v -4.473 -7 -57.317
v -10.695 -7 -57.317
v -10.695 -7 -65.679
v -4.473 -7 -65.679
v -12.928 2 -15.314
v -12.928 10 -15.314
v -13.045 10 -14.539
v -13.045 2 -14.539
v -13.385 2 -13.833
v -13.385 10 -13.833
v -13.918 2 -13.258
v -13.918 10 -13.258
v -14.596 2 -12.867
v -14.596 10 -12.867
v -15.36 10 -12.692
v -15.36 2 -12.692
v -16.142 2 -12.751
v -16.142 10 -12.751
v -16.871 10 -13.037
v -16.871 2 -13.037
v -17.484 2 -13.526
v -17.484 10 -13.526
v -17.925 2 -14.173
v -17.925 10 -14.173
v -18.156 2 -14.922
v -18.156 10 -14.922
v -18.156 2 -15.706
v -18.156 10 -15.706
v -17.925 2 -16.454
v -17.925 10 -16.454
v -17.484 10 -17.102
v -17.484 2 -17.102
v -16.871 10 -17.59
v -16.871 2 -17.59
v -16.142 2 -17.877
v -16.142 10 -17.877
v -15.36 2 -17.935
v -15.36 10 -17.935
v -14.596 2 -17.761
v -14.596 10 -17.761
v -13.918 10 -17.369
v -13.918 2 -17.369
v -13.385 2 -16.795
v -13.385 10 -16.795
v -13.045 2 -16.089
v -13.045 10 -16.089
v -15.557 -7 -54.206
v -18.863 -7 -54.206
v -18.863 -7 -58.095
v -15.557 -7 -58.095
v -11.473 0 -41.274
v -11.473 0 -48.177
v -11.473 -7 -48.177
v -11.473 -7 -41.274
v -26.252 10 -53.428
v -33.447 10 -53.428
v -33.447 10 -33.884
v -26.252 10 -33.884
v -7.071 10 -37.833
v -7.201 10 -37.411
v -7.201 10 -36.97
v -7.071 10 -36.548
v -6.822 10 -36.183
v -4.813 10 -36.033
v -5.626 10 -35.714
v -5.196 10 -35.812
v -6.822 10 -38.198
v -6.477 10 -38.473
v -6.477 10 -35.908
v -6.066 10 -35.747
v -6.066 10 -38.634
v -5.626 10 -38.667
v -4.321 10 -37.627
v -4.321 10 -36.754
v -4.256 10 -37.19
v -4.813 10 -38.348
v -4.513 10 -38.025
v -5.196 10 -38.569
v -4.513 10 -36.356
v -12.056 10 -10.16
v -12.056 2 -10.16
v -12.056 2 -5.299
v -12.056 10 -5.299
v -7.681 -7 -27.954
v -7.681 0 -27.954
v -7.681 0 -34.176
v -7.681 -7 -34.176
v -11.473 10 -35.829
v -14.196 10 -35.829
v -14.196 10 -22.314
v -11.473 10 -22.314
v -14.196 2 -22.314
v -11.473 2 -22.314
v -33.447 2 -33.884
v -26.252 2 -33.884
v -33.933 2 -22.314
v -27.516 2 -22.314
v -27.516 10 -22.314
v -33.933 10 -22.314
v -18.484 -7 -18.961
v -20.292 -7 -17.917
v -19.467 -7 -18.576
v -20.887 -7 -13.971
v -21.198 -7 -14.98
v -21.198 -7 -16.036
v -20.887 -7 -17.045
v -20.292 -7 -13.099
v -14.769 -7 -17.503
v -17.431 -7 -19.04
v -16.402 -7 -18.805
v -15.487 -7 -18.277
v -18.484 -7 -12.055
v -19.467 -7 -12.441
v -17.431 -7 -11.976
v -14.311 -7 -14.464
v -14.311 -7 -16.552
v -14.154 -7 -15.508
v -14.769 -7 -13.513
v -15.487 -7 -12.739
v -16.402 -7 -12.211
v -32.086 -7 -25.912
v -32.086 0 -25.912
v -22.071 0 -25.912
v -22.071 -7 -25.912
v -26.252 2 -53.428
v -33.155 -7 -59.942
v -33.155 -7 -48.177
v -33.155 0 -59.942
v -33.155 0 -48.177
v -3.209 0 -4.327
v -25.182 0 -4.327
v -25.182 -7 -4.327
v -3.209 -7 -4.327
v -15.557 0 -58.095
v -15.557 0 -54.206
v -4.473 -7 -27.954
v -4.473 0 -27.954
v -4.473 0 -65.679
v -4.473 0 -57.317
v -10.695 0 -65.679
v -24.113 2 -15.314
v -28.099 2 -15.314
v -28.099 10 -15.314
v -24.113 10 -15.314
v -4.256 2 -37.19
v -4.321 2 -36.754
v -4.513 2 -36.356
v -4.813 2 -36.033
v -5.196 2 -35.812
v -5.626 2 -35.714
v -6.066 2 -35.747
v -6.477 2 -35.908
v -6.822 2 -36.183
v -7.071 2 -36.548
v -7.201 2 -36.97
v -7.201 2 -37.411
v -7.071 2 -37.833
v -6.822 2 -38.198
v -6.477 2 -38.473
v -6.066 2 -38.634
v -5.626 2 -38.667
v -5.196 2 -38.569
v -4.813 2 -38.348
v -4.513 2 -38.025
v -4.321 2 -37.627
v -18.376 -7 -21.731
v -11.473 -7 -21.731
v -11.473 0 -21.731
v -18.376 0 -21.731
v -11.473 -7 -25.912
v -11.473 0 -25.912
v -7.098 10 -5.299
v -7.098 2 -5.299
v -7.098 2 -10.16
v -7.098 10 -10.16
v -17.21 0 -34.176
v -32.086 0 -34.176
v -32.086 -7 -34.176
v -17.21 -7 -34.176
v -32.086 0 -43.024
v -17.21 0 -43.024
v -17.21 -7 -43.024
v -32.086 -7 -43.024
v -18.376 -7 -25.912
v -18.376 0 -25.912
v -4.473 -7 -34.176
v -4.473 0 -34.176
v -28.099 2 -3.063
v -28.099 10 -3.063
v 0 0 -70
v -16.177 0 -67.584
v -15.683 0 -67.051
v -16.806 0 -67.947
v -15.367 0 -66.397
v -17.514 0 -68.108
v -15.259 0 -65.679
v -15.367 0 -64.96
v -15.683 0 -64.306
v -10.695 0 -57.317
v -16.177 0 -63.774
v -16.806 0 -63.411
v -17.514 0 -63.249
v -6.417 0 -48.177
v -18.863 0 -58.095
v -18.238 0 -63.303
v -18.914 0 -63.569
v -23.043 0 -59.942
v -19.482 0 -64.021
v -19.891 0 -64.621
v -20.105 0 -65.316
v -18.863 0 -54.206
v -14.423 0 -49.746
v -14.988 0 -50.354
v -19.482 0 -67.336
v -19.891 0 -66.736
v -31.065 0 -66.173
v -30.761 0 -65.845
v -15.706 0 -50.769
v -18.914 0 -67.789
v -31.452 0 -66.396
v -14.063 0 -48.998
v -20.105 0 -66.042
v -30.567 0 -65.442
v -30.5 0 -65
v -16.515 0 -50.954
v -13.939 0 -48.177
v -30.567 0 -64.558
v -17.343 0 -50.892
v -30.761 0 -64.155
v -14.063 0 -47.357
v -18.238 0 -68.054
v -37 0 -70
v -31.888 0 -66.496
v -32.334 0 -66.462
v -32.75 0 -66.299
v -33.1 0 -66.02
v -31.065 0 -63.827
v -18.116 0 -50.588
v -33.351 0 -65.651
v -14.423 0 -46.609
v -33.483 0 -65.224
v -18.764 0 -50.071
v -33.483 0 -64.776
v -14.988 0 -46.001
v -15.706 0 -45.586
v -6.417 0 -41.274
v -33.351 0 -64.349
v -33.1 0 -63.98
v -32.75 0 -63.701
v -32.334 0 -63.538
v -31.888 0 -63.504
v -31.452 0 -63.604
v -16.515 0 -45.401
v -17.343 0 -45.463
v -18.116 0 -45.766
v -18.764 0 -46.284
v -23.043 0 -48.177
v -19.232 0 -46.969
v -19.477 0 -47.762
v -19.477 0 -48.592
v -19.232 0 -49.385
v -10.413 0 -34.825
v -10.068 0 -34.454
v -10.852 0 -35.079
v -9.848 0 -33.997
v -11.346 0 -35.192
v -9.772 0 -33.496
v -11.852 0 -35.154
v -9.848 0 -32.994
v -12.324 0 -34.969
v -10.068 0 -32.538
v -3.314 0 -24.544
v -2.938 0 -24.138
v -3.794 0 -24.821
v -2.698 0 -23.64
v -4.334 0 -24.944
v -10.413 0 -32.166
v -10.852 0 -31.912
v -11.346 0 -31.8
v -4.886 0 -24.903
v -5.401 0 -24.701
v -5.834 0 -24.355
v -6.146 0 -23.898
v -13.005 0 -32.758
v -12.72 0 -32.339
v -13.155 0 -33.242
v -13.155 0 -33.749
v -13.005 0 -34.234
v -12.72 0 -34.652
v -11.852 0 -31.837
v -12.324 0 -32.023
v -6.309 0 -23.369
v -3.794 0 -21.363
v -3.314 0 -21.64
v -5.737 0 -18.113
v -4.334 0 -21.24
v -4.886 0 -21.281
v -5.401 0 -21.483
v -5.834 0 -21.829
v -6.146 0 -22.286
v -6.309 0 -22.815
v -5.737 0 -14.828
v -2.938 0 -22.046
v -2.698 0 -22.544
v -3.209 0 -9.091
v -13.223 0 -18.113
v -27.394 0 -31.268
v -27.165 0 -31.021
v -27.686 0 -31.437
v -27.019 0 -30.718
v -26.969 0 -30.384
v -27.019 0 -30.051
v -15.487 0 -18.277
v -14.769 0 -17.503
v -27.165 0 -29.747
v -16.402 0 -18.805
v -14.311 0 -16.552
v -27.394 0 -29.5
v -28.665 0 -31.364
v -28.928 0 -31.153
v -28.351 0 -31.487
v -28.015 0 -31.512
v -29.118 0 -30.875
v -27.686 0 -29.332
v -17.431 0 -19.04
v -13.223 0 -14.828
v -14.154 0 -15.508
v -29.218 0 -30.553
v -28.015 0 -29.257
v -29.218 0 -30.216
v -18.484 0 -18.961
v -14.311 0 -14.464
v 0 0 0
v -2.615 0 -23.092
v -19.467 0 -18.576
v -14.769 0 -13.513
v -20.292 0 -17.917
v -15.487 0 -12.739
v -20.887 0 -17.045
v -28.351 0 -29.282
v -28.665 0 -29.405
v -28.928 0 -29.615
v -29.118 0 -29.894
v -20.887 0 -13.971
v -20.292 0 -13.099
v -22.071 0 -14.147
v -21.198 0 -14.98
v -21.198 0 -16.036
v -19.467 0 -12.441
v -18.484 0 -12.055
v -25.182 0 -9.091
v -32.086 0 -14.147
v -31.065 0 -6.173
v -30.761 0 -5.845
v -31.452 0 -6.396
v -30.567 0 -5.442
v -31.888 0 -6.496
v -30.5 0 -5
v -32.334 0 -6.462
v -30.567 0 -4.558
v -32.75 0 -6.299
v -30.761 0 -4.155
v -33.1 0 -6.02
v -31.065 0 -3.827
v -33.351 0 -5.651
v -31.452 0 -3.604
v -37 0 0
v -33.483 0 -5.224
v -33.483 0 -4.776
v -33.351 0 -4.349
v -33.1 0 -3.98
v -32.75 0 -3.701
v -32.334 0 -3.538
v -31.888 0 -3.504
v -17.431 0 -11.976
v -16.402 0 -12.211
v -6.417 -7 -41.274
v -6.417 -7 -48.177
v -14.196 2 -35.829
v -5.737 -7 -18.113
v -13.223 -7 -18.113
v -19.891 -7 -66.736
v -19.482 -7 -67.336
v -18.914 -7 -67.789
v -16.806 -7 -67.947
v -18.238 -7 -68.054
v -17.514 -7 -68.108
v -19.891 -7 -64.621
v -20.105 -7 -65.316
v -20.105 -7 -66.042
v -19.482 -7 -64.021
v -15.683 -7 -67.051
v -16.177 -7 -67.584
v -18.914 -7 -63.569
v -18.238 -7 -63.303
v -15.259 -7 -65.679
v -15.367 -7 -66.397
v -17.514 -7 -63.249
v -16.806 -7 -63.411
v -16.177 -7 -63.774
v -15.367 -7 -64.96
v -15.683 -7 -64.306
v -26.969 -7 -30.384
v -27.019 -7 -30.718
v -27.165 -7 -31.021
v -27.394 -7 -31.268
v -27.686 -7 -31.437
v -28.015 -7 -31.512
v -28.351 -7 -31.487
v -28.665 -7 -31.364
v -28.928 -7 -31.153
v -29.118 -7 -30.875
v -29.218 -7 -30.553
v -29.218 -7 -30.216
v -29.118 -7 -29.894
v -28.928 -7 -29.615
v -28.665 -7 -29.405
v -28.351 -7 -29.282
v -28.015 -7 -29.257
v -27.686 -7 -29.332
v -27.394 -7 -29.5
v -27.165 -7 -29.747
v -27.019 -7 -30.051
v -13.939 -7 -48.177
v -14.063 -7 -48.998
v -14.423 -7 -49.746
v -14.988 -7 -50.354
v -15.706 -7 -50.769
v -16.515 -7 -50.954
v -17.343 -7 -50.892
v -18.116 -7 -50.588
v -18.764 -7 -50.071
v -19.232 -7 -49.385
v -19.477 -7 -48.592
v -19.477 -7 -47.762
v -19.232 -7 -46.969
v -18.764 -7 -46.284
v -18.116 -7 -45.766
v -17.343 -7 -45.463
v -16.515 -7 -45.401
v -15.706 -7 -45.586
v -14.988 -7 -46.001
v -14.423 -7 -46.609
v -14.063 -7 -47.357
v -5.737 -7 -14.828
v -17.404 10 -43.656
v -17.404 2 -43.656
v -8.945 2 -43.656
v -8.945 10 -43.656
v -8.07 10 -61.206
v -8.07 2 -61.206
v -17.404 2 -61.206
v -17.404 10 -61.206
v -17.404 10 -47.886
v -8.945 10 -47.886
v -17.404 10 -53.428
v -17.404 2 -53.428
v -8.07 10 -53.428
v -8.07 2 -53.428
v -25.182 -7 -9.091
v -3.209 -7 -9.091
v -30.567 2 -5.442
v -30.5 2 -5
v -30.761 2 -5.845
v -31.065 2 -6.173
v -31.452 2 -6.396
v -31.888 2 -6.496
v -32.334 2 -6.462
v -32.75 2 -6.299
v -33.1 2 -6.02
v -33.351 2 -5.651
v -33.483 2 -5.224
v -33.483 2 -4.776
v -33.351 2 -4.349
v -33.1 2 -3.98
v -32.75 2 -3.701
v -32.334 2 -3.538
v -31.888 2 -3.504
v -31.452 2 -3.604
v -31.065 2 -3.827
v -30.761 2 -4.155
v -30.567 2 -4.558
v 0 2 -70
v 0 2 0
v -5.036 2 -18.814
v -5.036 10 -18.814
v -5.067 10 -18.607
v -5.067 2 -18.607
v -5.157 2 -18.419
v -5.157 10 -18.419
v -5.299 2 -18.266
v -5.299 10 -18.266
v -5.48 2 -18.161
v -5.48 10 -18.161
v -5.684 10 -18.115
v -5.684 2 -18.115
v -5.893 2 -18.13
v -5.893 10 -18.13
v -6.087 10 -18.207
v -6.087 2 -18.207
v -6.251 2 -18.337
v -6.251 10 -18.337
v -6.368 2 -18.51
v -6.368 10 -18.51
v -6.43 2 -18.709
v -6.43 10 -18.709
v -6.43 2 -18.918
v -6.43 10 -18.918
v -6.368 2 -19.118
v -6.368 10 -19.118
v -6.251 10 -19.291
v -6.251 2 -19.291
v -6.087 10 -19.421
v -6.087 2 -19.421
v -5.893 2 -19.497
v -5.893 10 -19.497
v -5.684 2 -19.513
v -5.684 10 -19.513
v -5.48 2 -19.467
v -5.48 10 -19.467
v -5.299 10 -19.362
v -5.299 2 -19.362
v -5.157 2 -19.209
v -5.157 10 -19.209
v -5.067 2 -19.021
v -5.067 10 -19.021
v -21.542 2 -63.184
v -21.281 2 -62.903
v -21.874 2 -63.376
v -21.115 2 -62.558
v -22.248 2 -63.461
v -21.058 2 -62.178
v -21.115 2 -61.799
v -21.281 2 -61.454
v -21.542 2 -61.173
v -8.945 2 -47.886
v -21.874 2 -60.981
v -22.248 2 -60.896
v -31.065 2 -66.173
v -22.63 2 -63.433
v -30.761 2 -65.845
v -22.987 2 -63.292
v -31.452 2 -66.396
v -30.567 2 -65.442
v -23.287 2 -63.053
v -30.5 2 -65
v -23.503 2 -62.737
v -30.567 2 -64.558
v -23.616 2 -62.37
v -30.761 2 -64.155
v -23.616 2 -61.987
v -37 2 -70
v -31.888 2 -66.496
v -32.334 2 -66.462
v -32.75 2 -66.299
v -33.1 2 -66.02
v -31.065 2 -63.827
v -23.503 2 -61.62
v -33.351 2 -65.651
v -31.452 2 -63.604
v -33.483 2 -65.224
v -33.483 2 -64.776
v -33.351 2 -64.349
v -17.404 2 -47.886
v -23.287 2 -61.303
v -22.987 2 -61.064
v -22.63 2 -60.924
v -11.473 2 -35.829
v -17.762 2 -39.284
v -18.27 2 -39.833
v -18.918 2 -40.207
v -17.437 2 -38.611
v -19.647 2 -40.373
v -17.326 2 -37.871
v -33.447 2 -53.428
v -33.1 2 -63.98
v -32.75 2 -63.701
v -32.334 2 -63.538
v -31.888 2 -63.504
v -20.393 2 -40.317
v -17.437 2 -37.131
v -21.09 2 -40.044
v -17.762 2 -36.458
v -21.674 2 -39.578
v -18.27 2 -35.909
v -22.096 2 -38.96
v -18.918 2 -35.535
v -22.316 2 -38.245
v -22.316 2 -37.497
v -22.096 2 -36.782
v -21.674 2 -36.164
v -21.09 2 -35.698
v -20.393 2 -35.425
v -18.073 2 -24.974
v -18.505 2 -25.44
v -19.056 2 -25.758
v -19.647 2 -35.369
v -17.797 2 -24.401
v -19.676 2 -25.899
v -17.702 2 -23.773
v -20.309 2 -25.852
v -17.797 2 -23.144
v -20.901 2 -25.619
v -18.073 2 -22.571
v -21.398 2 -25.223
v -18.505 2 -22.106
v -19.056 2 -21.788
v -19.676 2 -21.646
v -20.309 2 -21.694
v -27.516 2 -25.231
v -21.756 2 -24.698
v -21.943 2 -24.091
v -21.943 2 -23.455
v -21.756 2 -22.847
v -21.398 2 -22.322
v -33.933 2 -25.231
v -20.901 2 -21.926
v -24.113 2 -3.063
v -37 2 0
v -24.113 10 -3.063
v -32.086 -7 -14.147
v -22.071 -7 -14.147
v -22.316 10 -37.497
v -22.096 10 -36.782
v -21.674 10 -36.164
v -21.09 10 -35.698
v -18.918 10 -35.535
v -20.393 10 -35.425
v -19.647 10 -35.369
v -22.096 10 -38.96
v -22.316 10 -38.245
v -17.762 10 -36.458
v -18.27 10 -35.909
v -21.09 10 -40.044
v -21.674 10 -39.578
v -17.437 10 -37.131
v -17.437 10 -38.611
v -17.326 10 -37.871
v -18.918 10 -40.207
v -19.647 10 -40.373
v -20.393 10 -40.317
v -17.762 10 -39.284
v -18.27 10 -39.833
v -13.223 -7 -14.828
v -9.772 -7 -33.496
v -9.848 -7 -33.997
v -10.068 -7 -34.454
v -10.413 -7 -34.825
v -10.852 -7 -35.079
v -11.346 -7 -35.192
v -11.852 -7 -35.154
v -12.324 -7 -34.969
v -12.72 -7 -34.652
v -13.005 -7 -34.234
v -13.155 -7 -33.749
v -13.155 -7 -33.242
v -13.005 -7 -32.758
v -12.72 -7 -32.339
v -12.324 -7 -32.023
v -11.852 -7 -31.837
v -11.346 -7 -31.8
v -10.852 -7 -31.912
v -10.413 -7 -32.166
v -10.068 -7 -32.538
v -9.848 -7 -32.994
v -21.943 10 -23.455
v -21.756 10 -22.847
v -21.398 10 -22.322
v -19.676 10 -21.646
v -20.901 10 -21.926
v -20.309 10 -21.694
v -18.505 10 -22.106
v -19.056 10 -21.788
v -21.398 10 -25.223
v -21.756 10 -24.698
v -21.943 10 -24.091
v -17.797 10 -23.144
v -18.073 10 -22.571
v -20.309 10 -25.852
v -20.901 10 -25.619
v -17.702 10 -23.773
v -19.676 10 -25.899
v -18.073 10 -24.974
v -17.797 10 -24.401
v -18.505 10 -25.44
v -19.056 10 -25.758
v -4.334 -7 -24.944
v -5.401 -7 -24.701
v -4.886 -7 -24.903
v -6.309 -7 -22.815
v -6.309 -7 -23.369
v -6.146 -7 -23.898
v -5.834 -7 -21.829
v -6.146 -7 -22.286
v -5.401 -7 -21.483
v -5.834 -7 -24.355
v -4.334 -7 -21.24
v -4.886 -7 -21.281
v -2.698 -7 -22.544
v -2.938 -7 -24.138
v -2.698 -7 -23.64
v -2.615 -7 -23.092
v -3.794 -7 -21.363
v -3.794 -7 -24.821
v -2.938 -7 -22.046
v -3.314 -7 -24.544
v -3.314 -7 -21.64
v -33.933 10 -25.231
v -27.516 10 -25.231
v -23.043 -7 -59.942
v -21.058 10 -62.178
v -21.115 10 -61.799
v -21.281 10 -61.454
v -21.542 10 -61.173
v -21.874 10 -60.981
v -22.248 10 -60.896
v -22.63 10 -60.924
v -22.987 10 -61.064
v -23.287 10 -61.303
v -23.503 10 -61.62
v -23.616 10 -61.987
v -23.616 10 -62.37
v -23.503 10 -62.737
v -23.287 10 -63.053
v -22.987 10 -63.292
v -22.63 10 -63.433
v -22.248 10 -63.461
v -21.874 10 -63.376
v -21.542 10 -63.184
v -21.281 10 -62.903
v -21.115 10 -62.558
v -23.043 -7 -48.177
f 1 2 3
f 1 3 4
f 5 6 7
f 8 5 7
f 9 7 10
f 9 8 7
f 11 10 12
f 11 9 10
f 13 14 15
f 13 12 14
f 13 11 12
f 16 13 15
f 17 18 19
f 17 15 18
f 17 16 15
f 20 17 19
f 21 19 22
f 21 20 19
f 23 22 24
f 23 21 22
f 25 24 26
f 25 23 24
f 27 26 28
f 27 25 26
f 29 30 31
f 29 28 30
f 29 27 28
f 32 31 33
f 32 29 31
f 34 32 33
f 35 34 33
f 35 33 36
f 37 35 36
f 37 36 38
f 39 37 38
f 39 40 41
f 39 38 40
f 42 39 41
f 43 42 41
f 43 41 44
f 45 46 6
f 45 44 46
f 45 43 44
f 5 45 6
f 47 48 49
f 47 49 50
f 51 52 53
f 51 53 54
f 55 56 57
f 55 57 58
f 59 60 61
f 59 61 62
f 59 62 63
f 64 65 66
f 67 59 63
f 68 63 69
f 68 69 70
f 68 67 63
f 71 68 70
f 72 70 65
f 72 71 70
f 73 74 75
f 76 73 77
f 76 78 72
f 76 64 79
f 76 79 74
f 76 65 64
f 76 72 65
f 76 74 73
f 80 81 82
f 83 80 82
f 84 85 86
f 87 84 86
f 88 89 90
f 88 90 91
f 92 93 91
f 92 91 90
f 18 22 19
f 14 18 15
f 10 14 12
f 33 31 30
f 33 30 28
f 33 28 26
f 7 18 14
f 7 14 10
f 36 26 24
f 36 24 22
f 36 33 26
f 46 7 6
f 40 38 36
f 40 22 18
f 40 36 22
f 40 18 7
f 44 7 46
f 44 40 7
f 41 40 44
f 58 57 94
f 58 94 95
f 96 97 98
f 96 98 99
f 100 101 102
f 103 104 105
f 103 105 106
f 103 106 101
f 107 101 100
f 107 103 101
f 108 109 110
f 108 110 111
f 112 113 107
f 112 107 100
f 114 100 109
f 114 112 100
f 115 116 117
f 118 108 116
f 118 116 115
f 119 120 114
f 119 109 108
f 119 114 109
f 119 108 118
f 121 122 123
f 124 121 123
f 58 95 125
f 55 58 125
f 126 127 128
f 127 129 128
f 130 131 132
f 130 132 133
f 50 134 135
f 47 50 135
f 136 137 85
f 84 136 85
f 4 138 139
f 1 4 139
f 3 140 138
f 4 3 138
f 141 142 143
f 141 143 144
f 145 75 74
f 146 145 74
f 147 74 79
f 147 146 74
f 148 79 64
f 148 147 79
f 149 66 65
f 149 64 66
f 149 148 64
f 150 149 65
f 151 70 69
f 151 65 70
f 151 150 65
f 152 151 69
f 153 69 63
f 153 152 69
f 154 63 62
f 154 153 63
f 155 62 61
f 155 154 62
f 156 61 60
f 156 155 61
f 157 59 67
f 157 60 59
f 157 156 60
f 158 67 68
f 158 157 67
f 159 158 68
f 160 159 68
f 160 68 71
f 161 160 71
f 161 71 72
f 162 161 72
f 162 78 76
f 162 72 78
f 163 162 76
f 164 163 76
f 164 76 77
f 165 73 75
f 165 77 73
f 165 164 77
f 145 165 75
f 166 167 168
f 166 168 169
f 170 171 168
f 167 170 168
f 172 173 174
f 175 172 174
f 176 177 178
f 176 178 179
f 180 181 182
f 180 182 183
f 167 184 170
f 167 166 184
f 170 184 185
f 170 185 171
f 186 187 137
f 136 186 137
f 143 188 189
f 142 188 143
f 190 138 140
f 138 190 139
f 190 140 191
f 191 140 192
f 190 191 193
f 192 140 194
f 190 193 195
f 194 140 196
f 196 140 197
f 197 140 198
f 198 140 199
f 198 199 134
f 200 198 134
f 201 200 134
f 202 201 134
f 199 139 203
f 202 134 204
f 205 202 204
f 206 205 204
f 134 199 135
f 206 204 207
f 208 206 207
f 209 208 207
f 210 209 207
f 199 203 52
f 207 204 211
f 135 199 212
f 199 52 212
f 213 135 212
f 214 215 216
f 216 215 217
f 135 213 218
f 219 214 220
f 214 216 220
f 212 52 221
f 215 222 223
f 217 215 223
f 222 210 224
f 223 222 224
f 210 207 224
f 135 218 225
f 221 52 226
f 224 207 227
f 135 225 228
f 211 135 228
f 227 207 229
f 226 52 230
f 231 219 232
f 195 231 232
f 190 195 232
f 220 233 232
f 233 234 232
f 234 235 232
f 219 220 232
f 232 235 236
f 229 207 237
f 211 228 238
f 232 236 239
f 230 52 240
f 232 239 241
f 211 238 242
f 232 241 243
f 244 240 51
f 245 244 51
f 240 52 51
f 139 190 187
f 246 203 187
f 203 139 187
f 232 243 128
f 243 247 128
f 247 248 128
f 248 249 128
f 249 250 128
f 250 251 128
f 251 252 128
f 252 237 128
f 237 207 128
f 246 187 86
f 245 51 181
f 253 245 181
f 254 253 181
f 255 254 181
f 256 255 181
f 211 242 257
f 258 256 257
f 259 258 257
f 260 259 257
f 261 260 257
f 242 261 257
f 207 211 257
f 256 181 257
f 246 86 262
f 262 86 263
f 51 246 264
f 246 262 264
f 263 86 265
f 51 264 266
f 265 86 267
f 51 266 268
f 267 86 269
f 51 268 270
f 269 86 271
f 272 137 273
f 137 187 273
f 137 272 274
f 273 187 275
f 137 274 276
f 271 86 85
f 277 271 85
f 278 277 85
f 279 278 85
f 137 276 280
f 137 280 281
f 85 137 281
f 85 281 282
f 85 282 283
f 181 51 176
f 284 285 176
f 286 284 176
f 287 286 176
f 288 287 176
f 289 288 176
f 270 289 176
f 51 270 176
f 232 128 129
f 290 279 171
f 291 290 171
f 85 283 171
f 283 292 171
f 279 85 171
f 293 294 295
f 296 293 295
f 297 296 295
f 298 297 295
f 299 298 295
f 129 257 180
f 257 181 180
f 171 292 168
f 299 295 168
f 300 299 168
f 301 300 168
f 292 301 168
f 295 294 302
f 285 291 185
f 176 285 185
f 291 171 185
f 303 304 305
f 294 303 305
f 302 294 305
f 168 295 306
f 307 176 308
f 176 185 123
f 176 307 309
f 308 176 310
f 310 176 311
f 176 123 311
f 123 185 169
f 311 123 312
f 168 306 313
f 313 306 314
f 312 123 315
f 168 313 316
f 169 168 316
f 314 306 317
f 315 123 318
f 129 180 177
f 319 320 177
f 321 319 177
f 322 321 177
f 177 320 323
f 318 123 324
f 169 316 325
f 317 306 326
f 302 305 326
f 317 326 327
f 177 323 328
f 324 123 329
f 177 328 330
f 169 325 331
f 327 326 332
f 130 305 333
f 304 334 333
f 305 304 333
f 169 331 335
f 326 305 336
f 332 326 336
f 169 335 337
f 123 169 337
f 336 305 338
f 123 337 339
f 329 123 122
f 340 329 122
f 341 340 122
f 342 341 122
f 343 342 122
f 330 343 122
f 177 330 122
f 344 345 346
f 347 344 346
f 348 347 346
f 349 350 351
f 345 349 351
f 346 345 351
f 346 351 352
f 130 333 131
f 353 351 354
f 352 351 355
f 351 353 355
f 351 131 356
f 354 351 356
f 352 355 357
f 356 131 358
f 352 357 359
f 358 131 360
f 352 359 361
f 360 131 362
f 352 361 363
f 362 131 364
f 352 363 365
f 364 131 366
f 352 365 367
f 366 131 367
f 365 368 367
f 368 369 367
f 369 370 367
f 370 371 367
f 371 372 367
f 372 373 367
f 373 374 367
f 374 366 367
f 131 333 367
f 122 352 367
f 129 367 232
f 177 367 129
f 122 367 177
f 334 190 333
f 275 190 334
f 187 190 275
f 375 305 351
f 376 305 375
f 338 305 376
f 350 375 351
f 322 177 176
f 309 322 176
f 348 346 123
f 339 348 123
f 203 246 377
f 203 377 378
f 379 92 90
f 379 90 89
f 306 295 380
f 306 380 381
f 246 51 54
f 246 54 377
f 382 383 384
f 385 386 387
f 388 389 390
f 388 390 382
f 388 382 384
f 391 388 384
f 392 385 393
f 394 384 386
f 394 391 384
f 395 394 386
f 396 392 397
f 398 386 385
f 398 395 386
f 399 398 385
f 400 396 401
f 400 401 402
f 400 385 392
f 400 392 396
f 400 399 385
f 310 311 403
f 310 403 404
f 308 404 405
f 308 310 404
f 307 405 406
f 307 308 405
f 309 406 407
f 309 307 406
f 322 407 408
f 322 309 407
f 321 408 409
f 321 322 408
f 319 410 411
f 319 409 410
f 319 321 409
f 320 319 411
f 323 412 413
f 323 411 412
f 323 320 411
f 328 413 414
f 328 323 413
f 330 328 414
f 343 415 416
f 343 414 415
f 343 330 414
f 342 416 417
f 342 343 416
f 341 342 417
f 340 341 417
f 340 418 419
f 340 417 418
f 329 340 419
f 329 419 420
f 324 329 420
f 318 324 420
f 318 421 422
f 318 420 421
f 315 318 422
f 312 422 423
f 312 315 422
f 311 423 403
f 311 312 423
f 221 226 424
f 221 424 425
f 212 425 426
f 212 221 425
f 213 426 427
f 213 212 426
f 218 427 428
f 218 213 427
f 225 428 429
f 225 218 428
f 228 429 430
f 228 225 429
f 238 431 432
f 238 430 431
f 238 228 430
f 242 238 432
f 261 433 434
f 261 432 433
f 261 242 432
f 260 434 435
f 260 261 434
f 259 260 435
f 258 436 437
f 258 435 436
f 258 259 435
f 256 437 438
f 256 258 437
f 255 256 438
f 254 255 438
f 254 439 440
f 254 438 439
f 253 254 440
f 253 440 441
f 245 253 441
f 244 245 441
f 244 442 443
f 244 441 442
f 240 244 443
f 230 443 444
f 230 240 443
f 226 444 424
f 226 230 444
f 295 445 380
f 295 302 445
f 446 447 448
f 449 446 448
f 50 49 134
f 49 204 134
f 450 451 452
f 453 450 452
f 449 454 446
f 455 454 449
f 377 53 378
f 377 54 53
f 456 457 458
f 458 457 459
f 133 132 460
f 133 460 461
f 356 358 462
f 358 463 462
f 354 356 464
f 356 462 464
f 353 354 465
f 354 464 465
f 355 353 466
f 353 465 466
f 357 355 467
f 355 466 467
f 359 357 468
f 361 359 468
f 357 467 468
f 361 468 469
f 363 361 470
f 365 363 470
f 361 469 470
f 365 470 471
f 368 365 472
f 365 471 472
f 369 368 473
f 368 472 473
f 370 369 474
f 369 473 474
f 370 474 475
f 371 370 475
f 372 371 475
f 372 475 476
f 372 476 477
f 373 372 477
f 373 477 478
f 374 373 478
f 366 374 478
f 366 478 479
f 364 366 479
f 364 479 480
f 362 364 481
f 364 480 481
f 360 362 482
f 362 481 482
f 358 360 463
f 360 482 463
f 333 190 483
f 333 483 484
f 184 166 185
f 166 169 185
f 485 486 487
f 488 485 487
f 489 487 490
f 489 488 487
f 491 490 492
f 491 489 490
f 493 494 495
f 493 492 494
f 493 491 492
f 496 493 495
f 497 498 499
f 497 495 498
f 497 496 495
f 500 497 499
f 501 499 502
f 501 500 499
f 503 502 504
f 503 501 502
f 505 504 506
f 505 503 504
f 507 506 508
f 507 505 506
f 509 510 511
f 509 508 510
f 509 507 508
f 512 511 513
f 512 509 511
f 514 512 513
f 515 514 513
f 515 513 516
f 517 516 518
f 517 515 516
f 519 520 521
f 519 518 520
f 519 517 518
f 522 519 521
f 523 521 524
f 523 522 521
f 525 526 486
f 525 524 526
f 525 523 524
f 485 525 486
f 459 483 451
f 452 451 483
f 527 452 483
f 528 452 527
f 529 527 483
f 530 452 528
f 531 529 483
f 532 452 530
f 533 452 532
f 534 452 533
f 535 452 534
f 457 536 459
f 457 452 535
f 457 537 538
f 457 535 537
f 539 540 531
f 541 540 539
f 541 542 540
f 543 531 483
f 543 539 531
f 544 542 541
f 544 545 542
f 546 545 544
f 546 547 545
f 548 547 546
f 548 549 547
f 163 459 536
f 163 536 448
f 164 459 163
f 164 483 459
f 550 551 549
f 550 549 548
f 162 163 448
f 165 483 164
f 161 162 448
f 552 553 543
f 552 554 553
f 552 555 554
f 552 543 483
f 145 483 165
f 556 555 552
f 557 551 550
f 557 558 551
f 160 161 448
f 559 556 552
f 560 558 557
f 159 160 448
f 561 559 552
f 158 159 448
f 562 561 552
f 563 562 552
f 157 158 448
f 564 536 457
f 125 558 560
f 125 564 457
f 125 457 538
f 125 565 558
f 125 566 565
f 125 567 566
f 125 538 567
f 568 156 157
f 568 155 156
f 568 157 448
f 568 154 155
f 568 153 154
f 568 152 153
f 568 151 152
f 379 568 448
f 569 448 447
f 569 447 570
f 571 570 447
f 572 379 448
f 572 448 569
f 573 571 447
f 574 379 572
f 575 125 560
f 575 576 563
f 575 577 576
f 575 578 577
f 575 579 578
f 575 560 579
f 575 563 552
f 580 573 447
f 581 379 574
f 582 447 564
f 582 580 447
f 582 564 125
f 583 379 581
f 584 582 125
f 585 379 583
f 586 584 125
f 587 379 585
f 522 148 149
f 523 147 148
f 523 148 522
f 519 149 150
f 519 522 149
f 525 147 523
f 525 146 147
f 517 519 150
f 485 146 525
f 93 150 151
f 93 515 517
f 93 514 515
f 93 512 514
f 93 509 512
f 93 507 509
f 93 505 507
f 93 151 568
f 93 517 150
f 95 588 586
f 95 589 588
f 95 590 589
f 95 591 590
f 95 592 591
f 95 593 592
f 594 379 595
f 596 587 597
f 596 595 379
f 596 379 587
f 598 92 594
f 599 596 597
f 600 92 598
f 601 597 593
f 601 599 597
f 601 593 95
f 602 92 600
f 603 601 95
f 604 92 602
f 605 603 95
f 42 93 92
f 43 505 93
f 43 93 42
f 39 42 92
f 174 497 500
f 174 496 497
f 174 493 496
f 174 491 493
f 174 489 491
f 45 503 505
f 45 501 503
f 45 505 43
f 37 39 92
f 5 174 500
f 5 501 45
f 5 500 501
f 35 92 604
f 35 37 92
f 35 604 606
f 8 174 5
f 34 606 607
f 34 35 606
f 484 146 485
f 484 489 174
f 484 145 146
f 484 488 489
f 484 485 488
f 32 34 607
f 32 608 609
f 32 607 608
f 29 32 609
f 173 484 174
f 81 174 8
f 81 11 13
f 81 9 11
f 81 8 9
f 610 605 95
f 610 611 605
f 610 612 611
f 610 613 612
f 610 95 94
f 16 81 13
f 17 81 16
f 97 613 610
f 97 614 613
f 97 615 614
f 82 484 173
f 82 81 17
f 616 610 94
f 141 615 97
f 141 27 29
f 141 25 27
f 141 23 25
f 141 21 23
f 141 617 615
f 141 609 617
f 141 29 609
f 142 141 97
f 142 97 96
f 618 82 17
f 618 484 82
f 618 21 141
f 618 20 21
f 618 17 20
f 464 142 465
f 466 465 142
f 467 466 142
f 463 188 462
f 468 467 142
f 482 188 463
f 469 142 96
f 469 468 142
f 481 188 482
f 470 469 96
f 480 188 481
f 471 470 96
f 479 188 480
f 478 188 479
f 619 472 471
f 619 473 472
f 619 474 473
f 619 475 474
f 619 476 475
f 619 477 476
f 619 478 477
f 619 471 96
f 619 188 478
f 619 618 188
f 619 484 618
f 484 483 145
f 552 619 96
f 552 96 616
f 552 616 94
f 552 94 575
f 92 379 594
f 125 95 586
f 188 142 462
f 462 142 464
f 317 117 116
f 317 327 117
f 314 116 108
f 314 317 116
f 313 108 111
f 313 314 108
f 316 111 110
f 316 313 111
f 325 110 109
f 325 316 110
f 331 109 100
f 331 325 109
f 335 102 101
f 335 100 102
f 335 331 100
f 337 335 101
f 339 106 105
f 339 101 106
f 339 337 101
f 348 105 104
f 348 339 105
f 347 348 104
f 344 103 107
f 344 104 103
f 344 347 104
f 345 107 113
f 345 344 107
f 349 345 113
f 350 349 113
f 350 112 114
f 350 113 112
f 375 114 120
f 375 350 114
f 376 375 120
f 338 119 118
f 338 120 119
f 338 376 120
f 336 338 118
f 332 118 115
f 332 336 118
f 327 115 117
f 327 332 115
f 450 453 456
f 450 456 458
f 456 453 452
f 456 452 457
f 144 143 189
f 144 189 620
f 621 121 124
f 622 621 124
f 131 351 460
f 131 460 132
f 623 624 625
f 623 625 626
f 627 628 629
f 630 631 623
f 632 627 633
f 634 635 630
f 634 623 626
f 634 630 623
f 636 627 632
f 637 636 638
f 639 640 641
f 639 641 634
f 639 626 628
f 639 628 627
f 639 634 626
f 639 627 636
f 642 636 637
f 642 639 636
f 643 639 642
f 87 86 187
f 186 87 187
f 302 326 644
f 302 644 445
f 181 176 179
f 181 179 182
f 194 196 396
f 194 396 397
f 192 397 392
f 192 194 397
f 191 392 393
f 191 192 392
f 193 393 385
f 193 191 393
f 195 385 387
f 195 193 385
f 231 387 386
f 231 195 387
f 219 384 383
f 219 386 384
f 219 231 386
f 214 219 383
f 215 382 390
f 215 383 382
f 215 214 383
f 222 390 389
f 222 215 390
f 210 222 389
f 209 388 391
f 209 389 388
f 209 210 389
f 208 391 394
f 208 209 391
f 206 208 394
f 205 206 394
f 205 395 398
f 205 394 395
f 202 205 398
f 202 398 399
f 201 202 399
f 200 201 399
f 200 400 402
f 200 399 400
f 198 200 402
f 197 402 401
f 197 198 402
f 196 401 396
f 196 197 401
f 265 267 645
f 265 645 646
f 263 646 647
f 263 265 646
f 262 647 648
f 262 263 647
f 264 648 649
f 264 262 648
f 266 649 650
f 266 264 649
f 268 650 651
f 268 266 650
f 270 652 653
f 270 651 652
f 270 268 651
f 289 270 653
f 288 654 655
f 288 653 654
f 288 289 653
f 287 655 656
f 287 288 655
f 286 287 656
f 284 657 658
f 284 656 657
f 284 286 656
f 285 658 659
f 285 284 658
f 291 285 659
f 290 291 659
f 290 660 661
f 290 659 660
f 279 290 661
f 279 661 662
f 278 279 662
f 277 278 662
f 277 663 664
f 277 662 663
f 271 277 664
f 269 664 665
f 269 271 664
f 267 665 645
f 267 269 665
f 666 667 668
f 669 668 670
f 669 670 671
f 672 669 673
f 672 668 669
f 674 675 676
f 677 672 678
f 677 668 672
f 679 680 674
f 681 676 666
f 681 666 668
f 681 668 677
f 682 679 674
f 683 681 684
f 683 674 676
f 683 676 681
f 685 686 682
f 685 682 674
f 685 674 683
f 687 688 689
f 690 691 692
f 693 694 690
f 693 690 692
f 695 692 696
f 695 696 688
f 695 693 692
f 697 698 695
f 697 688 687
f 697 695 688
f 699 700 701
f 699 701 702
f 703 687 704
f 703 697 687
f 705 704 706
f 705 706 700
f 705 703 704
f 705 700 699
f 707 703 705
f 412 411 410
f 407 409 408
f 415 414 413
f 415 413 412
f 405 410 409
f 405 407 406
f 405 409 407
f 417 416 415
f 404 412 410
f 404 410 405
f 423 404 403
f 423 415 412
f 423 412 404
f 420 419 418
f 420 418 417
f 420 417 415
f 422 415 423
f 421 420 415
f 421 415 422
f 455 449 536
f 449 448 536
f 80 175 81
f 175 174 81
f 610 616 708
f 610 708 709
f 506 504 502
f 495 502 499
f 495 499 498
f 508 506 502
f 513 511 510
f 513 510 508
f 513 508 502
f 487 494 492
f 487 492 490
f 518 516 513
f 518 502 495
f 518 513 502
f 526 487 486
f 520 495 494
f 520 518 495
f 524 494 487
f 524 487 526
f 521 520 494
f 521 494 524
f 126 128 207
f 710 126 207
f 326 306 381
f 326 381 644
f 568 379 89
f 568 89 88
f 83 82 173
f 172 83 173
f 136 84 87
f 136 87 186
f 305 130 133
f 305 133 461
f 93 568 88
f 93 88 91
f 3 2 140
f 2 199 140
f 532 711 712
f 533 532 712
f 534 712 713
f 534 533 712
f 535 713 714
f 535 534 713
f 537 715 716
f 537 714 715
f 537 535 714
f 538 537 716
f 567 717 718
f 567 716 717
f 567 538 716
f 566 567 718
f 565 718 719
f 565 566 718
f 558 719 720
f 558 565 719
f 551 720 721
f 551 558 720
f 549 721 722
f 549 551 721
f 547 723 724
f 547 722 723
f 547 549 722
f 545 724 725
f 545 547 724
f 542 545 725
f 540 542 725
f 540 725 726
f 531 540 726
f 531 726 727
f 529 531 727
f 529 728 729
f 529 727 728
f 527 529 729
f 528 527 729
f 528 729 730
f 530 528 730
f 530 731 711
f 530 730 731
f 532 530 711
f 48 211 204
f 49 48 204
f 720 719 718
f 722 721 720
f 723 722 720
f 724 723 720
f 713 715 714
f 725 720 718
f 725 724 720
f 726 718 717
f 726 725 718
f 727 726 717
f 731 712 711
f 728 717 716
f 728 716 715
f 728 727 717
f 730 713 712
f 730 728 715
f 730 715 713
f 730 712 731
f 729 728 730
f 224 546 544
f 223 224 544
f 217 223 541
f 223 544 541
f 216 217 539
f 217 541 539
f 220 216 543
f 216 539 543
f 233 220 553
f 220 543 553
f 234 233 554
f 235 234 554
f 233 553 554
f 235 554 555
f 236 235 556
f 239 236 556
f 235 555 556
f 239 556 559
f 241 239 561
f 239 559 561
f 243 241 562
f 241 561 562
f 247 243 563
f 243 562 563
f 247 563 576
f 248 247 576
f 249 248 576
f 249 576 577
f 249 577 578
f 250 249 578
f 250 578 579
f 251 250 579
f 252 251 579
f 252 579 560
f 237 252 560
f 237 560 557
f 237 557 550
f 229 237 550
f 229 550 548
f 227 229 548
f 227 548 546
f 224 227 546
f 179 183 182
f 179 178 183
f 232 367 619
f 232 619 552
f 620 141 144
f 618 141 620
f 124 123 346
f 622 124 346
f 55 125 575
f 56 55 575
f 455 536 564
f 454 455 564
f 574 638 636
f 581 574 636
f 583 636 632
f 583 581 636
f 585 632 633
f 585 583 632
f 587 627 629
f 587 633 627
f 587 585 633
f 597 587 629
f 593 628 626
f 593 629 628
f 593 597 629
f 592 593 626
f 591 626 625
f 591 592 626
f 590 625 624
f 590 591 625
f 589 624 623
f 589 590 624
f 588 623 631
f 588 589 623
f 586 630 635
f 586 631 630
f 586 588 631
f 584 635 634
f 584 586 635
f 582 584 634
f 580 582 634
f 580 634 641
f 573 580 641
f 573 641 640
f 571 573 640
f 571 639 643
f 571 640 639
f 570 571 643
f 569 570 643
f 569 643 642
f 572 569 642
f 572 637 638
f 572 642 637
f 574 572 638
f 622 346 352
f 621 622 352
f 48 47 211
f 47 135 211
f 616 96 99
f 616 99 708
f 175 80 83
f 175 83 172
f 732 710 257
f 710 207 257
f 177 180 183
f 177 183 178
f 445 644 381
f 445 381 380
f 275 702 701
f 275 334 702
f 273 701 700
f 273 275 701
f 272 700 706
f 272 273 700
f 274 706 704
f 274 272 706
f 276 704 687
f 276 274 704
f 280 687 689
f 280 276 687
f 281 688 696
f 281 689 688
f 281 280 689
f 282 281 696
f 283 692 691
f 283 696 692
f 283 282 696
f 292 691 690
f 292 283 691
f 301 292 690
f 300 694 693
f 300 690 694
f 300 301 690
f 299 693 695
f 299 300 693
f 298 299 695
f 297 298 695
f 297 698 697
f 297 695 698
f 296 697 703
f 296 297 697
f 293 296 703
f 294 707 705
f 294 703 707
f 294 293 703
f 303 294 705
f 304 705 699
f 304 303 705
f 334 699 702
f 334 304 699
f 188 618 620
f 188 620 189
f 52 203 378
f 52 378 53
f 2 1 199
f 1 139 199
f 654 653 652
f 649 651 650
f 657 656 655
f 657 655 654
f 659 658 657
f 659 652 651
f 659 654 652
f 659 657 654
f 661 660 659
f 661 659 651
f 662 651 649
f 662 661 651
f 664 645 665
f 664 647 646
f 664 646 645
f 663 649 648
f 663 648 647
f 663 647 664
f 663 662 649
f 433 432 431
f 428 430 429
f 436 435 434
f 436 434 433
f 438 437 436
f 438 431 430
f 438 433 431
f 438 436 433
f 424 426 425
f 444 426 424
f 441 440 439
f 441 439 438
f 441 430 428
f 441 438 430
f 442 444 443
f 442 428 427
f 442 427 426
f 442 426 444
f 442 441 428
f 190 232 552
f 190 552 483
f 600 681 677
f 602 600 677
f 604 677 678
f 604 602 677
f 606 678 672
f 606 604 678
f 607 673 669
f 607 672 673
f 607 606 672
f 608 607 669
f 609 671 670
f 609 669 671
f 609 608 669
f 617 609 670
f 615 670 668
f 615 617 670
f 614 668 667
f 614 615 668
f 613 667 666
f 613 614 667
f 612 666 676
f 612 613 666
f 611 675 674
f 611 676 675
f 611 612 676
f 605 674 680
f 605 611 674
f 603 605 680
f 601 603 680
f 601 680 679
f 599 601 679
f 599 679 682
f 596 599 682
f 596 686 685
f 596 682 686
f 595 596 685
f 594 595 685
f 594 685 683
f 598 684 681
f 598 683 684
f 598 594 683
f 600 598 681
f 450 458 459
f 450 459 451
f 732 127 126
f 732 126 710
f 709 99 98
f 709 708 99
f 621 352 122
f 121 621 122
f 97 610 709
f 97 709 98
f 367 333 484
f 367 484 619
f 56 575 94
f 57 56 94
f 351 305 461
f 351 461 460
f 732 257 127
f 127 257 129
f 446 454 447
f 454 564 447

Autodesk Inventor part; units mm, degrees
ref_plane "YZ Plane" through (0, 0, 0) normal (1, 0, 0) x (0, 1, 0)
ref_plane "XZ Plane" through (0, 0, 0) normal (0, 1, 0) x (-1, 0, 0)
ref_plane "XY Plane" through (0, 0, 0) normal (0, 0, 1) x (1, 0, 0)
sketch "Sketch1" plane through (0, 0, 0) normal (0, 1, 0) x (-1, 0, 0)
  line L0 (0, 0) -> (37, 0)
  line L1 (37, 0) -> (37, -70)
  line L2 (37, -70) -> (0, -70)
  line L3 (0, -70) -> (0, 0)
  dimension "d0" = 37
  dimension "d1" = 70
extrude "Extrusion1" add sketch "Sketch1" along normal blind 2
sketch "Sketch2" plane through (0, 2, 0) normal (0, 1, 0) x (1, 0, 0)
  circle A0 centre (-32, 5) radius 1.5
  circle A1 centre (-32, 65) radius 1.5
  line L0 (-37, 70) -> (-37, 0) projected
  line L1 (-37, 0) -> (0, 0) projected
  line L2 (0, 70) -> (-37, 70) projected
  dimension "d4" = 3
  dimension "d5" = 3
  dimension "d6" = 5
  dimension "d11" = 60
  dimension "d12" = 5
extrude "Extrusion2" cut sketch "Sketch2" against normal through all
sketch "Sketch3" plane through (0, 2, 0) normal (0, 1, 0) x (1, 0, 0)
  line L0 (-8.0701, 61.2061) -> (-17.4041, 61.2061)
  line L1 (-17.4041, 61.2061) -> (-17.4041, 53.4277)
  line L2 (-17.4041, 53.4277) -> (-8.0701, 53.4277)
  line L3 (-8.0701, 53.4277) -> (-8.0701, 61.2061)
  line L4 (-26.252, 53.4277) -> (-33.447, 53.4277)
  line L5 (-33.447, 53.4277) -> (-33.447, 33.8845)
  line L6 (-33.447, 33.8845) -> (-26.252, 33.8845)
  line L7 (-26.252, 33.8845) -> (-26.252, 53.4277)
  line L8 (-14.1955, 35.8291) -> (-11.4731, 35.8291)
  line L9 (-11.4731, 35.8291) -> (-11.4731, 22.3142)
  line L10 (-11.4731, 22.3142) -> (-14.1955, 22.3142)
  line L11 (-14.1955, 22.3142) -> (-14.1955, 35.8291)
  line L12 (-8.9451, 47.8856) -> (-17.4041, 47.8856)
  line L13 (-17.4041, 47.8856) -> (-17.4041, 43.6561)
  line L14 (-17.4041, 43.6561) -> (-8.9451, 43.6561)
  line L15 (-8.9451, 43.6561) -> (-8.9451, 47.8856)
  line L16 (-7.0978, 10.1605) -> (-12.0565, 10.1605)
  line L17 (-12.0565, 10.1605) -> (-12.0565, 5.299)
  line L18 (-12.0565, 5.299) -> (-7.0978, 5.299)
  line L19 (-7.0978, 5.299) -> (-7.0978, 10.1605)
  line L20 (-24.113, 3.0627) -> (-28.0994, 3.0627)
  line L21 (-28.0994, 3.0627) -> (-28.0994, 15.3137)
  line L22 (-28.0994, 15.3137) -> (-24.113, 15.3137)
  line L23 (-24.113, 15.3137) -> (-24.113, 3.0627)
  line L24 (-27.516, 22.3142) -> (-33.9332, 22.3142)
  line L25 (-33.9332, 22.3142) -> (-33.9332, 25.2311)
  line L26 (-33.9332, 25.2311) -> (-27.516, 25.2311)
  line L27 (-27.516, 25.2311) -> (-27.516, 22.3142)
  circle A0 centre (-19.8349, 37.871) radius 2.5092
  circle A1 centre (-19.8349, 23.7727) radius 2.1324
  circle A2 centre (-5.7366, 37.1904) radius 1.481
  circle A3 centre (-5.7366, 18.8139) radius 0.7011
  circle A4 centre (-15.5567, 15.3137) radius 2.6288
  circle A5 centre (-22.3441, 62.1784) radius 1.2864
  point P0 (0, 0)
extrude "Extrusion3" add sketch "Sketch3" along normal blind 8
sketch "Sketch4" plane through (0, 0, 0) normal (0, -1, 0) x (1, 0, 0)
  line L0 (-18.8626, -58.0947) -> (-15.5567, -58.0947)
  line L1 (-15.5567, -58.0947) -> (-15.5567, -54.2055)
  line L2 (-15.5567, -54.2055) -> (-18.8626, -54.2055)
  line L3 (-18.8626, -54.2055) -> (-18.8626, -58.0947)
  line L4 (-18.3764, -25.9117) -> (-11.4731, -25.9117)
  line L5 (-11.4731, -25.9117) -> (-11.4731, -21.7308)
  line L6 (-11.4731, -21.7308) -> (-18.3764, -21.7308)
  line L7 (-18.3764, -21.7308) -> (-18.3764, -25.9117)
  line L8 (-6.4172, -48.1773) -> (-11.4731, -48.1773)
  line L9 (-11.4731, -48.1773) -> (-11.4731, -41.274)
  line L10 (-11.4731, -41.274) -> (-6.4172, -41.274)
  line L11 (-6.4172, -41.274) -> (-6.4172, -48.1773)
  line L12 (-32.0858, -34.1762) -> (-17.2097, -34.1762)
  line L13 (-17.2097, -34.1762) -> (-17.2097, -43.0241)
  line L14 (-17.2097, -43.0241) -> (-32.0858, -43.0241)
  line L15 (-32.0858, -43.0241) -> (-32.0858, -34.1762)
  line L16 (-33.1553, -59.9421) -> (-23.0434, -59.9421)
  line L17 (-23.0434, -59.9421) -> (-23.0434, -48.1773)
  line L18 (-23.0434, -48.1773) -> (-33.1553, -48.1773)
  line L19 (-33.1553, -48.1773) -> (-33.1553, -59.9421)
  line L20 (-32.0858, -25.9117) -> (-22.0711, -25.9117)
  line L21 (-22.0711, -25.9117) -> (-22.0711, -14.1469)
  line L22 (-22.0711, -14.1469) -> (-32.0858, -14.1469)
  line L23 (-32.0858, -14.1469) -> (-32.0858, -25.9117)
  line L24 (-25.1825, -4.3267) -> (-3.2086, -4.3267)
  line L25 (-3.2086, -4.3267) -> (-3.2086, -9.091)
  line L26 (-3.2086, -9.091) -> (-25.1825, -9.091)
  line L27 (-25.1825, -9.091) -> (-25.1825, -4.3267)
  circle A0 centre (-5.7366, -18.8139) radius 0.7011 projected
  line L28 (-13.2232, -14.8275) -> (-5.7366, -14.8275)
  line L29 (-5.7366, -14.8275) -> (-5.7366, -18.1128)
  line L30 (-5.7366, -18.1128) -> (-13.2232, -18.1128)
  line L31 (-13.2232, -18.1128) -> (-13.2232, -14.8275)
  line L32 (-7.6811, -34.1762) -> (-4.4726, -34.1762)
  line L33 (-4.4726, -34.1762) -> (-4.4726, -27.9535)
  line L34 (-4.4726, -27.9535) -> (-7.6811, -27.9535)
  line L35 (-7.6811, -27.9535) -> (-7.6811, -34.1762)
  line L36 (-10.6953, -65.6787) -> (-4.4726, -65.6787)
  line L37 (-4.4726, -65.6787) -> (-4.4726, -57.3169)
  line L38 (-4.4726, -57.3169) -> (-10.6953, -57.3169)
  line L39 (-10.6953, -57.3169) -> (-10.6953, -65.6787)
  circle A1 centre (-17.6958, -65.6787) radius 2.4366
  circle A2 centre (-16.7235, -48.1773) radius 2.7842
  circle A3 centre (-11.4731, -33.4956) radius 1.7008
  circle A4 centre (-28.0994, -30.3843) radius 1.1308
  circle A5 centre (-17.6958, -15.5081) radius 3.5421
  circle A6 centre (-4.4726, -23.092) radius 1.8576
  point P0 (0, 0)
extrude "Extrusion4" add sketch "Sketch4" along normal blind 7 contours L3 L2 L1 L0 | L7 L6 L5 L4 | L8 L9 L10 L11 | L12 L13 L14 L15 | L19 L18 L17 L16 | L23 L22 L21 L20 | L24 L25 L26 L27 | L30 L31 L28 L29 | L35 L34 L33 L32 | L39 L38 L37 L36 | A1 | A2 | A3 | A4 | A5 | A6
properties part number "printplaat"
